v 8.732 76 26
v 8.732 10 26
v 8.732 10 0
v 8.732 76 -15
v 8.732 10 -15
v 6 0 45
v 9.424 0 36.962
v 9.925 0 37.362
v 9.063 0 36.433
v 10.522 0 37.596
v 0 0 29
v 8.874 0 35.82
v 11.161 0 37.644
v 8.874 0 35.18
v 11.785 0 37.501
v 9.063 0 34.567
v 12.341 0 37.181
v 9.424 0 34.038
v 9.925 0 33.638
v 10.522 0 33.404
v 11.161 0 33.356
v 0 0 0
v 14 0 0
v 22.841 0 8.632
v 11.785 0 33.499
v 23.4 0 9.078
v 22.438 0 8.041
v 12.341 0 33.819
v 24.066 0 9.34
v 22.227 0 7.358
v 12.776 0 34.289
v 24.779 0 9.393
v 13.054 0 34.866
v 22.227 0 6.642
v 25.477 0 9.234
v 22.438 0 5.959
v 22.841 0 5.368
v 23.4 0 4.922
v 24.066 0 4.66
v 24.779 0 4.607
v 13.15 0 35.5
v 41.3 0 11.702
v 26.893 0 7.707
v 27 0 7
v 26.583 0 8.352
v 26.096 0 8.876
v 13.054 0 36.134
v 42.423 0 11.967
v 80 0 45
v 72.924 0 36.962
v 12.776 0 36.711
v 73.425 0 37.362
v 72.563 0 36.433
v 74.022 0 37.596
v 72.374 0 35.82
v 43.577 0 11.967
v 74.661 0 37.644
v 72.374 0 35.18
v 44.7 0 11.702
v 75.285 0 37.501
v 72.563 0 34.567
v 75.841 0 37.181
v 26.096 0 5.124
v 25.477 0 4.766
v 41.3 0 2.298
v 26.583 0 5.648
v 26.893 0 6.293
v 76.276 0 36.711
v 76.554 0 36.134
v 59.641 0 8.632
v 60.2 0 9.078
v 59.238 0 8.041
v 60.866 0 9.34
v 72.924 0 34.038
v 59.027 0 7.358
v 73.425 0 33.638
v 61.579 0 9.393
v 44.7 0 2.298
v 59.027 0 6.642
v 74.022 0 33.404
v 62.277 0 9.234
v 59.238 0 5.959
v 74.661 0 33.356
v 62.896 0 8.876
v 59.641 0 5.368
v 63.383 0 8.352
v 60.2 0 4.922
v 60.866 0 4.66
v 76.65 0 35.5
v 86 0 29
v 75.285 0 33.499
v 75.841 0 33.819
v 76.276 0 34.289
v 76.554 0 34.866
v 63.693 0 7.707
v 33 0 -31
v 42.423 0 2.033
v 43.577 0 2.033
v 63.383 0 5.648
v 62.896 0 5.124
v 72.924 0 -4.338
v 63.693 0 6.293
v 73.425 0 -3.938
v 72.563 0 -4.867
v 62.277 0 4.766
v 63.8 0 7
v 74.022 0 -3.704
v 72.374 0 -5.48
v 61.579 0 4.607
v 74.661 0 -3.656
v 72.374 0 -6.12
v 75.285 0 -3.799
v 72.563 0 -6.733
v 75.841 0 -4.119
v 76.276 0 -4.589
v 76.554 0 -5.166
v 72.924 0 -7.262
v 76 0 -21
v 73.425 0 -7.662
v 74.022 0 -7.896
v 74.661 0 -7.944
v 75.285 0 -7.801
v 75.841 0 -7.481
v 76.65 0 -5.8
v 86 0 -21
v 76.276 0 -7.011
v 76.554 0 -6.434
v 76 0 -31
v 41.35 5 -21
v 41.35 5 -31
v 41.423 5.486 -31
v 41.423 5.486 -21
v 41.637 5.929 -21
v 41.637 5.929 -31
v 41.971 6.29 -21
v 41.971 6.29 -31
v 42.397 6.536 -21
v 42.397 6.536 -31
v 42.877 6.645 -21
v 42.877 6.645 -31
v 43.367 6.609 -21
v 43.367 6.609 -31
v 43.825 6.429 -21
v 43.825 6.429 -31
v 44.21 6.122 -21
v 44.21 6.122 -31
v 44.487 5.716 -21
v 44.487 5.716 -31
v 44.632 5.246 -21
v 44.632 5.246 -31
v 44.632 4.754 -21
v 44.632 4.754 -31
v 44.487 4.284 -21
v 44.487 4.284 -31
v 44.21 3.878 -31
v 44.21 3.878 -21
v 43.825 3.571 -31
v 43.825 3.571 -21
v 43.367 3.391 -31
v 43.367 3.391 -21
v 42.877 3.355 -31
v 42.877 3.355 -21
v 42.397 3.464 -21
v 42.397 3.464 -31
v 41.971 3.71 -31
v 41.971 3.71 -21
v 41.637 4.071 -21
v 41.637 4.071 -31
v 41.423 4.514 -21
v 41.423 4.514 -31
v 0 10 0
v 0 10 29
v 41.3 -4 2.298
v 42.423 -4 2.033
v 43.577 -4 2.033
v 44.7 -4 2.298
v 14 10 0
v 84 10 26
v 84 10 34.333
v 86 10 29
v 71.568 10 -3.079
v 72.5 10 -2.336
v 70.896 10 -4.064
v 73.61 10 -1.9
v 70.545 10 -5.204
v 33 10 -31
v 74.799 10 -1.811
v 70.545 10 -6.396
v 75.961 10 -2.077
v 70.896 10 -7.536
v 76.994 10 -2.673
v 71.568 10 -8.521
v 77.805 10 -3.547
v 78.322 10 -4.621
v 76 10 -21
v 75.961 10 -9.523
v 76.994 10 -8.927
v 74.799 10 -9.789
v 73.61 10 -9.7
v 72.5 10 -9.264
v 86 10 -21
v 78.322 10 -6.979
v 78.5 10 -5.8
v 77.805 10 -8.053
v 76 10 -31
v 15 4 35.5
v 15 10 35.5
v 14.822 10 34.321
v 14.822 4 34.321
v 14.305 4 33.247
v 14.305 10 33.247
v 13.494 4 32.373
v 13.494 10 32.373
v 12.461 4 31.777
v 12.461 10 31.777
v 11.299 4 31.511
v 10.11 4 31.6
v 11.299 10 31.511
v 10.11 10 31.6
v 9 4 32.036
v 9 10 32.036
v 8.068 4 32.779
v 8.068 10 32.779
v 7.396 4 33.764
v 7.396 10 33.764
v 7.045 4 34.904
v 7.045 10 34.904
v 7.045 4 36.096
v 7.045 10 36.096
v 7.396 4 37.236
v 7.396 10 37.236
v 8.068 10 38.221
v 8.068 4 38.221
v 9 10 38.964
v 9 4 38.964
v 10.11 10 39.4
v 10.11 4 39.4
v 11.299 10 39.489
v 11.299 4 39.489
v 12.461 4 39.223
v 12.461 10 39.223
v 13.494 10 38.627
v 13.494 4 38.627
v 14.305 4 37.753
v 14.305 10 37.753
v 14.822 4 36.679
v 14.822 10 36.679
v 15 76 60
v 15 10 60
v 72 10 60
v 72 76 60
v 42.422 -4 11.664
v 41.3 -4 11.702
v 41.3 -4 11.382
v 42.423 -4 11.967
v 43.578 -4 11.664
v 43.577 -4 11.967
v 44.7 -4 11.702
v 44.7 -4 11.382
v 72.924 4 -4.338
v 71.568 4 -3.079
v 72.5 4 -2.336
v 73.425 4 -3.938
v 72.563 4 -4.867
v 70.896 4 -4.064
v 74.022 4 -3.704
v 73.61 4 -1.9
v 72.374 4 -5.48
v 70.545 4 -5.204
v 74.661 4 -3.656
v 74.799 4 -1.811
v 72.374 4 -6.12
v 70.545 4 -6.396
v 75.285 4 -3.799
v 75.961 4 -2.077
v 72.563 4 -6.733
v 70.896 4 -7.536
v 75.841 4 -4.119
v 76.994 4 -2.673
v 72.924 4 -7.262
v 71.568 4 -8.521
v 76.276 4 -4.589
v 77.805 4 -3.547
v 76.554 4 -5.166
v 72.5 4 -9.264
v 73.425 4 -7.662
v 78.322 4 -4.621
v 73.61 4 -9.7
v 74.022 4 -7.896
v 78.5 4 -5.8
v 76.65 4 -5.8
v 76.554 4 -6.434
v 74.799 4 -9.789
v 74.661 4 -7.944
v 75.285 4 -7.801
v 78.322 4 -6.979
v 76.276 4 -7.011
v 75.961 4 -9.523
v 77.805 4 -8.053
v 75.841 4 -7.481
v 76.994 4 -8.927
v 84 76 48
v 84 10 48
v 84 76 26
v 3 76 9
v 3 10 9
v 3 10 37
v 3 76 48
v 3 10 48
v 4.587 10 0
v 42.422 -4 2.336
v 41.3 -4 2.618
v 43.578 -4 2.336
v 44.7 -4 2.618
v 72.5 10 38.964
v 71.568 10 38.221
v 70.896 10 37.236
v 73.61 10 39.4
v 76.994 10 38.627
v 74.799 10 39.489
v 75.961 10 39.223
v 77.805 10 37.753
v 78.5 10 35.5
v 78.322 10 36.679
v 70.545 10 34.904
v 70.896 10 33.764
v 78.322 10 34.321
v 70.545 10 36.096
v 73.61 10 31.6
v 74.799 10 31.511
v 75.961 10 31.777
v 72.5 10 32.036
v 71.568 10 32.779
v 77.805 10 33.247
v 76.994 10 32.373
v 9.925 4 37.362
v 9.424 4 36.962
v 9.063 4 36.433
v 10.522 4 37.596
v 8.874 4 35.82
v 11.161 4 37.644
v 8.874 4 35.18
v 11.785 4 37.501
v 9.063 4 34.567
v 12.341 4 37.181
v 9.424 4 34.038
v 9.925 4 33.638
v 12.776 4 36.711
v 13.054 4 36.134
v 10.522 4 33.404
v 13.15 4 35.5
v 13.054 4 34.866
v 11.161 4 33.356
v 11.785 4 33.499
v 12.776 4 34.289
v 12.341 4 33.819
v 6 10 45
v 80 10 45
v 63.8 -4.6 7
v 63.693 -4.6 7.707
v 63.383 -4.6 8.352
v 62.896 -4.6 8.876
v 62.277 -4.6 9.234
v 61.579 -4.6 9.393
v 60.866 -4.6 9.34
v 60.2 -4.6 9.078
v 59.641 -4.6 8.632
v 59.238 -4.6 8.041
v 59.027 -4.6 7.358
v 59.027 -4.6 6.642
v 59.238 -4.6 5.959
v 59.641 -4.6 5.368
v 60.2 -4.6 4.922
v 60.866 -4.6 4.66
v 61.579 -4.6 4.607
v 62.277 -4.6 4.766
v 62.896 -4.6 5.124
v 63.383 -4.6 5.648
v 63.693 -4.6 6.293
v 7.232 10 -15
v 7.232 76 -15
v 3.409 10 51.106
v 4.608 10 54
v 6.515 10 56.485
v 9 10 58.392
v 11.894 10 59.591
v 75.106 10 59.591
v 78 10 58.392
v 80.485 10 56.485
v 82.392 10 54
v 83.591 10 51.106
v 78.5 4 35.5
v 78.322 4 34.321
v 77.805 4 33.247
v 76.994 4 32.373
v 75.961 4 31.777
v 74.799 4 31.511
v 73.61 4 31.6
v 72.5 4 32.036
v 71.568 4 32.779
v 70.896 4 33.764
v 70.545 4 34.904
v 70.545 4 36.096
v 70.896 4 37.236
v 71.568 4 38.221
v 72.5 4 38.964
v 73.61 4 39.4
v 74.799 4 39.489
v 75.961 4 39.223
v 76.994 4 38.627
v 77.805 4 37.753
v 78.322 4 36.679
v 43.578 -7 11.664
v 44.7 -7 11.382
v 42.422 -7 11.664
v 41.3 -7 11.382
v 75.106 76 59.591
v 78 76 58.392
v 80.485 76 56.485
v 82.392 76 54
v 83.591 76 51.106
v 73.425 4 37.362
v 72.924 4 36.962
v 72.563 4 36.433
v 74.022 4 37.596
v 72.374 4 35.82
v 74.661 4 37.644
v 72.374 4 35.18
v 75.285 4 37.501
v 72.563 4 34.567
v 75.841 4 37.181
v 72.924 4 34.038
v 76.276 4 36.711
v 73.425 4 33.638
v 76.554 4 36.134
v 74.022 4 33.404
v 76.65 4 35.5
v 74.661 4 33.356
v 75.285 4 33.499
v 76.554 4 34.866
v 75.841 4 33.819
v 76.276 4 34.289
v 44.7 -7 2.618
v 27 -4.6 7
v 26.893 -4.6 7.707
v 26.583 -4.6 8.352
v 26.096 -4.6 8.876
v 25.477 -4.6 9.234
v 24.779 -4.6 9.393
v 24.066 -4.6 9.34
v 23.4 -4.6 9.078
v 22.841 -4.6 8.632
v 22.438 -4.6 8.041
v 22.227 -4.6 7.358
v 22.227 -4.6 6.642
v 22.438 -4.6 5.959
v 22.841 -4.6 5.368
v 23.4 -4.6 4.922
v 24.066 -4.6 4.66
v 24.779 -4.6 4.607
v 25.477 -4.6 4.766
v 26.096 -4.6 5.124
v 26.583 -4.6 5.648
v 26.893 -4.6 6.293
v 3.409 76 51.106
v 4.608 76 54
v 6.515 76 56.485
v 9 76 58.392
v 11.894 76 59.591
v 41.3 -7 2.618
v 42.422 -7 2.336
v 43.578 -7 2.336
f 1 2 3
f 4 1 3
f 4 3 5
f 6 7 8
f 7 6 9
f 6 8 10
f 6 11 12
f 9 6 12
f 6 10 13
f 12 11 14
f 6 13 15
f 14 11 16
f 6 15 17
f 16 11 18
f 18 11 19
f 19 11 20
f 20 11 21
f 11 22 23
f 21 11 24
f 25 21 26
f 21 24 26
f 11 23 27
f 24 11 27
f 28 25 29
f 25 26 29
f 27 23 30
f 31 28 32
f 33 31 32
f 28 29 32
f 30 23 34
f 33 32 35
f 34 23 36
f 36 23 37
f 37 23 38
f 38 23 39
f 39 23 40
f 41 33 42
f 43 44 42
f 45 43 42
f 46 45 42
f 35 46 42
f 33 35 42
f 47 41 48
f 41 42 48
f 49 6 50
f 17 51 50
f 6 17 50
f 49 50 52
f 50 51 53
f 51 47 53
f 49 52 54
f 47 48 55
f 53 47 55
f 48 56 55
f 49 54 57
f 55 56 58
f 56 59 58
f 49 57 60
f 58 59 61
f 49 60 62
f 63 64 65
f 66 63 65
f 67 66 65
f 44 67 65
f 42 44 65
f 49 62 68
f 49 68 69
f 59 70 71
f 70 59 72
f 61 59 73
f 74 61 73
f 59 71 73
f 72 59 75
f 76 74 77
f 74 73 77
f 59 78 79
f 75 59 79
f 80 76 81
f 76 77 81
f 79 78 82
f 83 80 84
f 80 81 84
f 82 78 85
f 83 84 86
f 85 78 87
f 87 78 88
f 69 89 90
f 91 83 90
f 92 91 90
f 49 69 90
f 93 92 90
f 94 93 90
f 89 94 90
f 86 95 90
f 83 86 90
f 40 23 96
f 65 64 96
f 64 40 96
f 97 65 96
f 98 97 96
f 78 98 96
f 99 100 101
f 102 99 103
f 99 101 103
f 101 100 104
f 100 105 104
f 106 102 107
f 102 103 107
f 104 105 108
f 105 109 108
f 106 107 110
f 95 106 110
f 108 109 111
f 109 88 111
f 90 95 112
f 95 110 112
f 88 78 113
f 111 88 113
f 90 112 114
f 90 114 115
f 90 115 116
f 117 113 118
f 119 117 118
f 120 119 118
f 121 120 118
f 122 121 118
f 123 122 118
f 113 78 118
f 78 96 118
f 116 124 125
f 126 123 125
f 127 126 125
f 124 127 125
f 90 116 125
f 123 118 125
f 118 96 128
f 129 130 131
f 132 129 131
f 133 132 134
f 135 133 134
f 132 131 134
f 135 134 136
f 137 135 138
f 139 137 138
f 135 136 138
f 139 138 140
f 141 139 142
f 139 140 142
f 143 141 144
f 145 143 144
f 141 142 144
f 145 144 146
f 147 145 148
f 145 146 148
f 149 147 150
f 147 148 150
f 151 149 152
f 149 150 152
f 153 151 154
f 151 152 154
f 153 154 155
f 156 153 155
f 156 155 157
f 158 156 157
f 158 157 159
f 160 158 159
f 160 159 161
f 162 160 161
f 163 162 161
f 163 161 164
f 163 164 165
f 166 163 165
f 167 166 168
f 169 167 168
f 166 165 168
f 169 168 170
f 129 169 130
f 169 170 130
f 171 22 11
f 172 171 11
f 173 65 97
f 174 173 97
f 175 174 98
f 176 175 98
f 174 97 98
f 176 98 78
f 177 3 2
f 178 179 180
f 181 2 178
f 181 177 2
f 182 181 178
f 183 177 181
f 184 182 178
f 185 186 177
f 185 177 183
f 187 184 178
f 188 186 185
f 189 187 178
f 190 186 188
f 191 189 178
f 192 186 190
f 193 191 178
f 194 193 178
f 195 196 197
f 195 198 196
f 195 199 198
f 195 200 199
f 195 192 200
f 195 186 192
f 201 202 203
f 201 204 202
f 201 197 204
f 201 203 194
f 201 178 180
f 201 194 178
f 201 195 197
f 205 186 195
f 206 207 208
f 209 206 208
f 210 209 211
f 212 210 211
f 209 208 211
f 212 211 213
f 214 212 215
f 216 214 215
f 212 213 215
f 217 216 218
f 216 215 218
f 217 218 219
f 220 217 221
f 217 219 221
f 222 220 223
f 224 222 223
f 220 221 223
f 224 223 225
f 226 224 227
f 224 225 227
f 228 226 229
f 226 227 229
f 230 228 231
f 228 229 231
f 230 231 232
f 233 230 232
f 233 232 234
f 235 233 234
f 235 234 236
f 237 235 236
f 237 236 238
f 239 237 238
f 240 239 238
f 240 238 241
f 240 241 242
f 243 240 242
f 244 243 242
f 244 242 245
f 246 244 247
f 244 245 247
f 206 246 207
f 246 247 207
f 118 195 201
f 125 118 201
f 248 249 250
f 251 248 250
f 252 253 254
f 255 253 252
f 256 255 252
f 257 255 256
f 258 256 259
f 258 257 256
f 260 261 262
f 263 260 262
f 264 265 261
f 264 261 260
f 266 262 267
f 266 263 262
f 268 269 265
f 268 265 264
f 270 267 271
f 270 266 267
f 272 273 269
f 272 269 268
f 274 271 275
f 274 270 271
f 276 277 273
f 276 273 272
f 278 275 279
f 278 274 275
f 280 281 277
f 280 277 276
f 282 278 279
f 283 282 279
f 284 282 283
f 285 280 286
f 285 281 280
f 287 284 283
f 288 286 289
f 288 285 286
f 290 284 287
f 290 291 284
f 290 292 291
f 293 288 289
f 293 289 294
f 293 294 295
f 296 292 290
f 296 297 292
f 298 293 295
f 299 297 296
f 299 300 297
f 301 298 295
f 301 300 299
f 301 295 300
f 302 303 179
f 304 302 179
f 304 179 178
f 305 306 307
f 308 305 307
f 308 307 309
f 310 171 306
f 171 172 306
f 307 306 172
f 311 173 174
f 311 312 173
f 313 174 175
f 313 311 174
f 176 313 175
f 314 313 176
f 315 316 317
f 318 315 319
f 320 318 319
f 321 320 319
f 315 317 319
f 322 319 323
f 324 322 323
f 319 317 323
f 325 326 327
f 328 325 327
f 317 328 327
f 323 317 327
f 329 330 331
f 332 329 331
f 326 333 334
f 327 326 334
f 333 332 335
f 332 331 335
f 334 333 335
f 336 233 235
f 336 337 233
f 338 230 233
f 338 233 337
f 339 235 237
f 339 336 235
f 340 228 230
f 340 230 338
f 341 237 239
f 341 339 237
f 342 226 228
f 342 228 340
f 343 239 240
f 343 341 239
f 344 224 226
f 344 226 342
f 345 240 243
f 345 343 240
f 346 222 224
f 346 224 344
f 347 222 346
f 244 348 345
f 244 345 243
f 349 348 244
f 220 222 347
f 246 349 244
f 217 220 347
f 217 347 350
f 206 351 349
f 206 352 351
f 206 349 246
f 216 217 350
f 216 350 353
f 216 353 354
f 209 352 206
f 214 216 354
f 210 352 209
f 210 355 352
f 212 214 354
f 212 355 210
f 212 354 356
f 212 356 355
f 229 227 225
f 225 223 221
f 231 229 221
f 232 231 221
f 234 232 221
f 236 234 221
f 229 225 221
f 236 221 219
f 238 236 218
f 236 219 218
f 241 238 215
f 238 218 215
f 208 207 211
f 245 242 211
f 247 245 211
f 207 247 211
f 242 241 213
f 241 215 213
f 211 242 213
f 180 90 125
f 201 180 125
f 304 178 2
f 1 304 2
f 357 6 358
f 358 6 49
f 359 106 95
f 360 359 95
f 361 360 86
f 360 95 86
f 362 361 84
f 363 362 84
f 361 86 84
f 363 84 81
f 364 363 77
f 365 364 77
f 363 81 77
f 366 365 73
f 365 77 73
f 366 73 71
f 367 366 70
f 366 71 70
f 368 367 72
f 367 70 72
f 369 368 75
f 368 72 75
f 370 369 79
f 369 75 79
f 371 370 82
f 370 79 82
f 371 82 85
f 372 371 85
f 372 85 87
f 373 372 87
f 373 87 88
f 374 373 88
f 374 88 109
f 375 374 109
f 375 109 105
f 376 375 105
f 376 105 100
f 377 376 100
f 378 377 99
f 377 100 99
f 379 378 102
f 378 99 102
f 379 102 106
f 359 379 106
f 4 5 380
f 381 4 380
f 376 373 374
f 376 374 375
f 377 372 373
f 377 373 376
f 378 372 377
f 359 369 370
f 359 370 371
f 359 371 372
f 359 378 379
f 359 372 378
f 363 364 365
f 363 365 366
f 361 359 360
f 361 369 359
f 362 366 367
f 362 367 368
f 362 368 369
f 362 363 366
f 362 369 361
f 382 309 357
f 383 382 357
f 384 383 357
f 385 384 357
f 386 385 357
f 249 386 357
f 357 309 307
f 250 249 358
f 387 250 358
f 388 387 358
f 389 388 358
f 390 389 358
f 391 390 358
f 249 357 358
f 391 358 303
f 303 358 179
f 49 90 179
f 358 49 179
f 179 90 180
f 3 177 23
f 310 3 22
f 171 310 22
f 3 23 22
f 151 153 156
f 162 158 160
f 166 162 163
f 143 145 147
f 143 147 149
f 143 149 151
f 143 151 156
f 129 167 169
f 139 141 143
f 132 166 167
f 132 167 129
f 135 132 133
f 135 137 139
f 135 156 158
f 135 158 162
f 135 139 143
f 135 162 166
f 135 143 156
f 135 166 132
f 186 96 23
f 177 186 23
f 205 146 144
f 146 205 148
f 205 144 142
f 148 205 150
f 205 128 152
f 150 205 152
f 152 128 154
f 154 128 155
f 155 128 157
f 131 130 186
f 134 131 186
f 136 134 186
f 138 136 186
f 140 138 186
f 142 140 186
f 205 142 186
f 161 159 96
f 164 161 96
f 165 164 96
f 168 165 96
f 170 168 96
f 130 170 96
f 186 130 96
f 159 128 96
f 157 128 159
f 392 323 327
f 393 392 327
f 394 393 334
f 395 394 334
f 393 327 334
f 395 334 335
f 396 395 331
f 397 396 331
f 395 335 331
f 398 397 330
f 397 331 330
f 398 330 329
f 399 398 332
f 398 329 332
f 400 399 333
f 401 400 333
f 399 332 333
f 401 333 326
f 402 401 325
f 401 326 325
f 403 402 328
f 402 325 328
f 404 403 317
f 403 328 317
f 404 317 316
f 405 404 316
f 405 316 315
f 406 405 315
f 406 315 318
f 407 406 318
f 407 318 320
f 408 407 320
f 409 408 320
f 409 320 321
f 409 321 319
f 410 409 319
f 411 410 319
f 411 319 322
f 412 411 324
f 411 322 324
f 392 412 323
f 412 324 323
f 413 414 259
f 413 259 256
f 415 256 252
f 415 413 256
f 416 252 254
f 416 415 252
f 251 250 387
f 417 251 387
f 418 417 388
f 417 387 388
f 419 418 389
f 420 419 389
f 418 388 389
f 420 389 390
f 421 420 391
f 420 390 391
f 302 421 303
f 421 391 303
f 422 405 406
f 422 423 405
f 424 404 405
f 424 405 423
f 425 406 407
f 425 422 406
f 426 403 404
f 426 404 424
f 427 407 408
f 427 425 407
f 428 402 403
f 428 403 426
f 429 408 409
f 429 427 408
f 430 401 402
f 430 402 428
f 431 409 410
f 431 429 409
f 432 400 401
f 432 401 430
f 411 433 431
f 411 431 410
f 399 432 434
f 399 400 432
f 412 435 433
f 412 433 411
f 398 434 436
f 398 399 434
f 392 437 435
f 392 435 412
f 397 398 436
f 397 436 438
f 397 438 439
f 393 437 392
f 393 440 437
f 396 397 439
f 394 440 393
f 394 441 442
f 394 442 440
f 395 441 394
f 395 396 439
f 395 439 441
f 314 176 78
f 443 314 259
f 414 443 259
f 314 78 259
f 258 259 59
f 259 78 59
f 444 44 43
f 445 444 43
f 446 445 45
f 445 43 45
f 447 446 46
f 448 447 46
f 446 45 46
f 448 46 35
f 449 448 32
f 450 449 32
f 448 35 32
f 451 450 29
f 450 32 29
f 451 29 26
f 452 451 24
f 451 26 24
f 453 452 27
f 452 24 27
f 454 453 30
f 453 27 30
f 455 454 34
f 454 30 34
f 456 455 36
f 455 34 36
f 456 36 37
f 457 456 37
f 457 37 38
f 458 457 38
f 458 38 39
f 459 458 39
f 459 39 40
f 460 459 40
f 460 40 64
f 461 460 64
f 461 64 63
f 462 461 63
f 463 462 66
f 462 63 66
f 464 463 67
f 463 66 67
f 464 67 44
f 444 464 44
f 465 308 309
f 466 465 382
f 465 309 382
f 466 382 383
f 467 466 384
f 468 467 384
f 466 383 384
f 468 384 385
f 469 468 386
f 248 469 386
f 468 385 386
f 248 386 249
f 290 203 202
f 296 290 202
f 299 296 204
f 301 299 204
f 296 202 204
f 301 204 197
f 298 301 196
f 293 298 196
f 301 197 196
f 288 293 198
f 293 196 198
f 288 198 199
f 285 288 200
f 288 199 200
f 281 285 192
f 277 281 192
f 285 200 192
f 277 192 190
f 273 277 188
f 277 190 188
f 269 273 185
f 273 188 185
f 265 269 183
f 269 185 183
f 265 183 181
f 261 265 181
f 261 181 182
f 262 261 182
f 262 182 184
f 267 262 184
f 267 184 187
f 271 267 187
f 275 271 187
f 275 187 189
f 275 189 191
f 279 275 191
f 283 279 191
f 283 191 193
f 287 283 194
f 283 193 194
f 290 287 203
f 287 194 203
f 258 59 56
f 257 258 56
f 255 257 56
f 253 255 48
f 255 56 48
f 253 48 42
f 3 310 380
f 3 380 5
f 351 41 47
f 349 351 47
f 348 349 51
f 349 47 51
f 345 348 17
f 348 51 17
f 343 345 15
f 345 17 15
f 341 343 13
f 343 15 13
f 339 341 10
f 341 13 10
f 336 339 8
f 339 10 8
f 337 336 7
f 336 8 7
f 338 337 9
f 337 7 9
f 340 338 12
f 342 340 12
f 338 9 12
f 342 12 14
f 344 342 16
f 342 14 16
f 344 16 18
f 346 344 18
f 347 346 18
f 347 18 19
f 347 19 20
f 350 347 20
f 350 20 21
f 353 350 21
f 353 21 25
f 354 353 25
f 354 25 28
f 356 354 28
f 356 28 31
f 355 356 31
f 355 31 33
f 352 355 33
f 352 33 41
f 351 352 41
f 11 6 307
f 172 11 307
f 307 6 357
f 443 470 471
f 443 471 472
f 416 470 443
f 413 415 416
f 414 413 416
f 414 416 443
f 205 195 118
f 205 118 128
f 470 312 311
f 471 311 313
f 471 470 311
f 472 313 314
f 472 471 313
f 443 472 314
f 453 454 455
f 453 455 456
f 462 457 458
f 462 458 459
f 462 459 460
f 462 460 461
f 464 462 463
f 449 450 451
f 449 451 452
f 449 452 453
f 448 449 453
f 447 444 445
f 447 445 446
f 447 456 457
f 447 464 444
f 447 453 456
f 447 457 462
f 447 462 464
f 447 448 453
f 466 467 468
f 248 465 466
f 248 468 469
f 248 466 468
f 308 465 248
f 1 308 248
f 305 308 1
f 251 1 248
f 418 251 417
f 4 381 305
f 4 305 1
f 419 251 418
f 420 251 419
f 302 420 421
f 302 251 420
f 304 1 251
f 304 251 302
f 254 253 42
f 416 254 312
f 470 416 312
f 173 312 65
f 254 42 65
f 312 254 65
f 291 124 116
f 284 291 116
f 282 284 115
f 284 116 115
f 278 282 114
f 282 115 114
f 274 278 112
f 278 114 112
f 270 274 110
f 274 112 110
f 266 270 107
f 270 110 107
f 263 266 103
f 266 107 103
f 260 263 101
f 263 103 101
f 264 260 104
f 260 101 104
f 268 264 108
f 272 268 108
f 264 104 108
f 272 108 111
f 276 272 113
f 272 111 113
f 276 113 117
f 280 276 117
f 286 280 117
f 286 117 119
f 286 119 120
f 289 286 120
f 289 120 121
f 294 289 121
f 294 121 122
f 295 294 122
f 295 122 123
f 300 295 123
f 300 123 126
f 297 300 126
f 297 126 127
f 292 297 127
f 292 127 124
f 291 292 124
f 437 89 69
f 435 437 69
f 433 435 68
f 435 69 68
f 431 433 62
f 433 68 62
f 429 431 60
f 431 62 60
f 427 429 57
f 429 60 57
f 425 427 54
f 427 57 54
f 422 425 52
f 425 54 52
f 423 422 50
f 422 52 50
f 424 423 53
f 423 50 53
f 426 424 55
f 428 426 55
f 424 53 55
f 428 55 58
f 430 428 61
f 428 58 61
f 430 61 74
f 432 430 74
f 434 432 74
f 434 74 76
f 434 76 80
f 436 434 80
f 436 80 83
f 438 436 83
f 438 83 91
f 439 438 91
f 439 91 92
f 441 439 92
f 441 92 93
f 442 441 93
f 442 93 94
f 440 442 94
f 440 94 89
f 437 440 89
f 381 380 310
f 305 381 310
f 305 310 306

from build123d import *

# Parameters (mm, degrees)
BOSS_EXTRUDE1_DEPTH = 10
CHAMFER1_SIZE       = 6
CHAMFER1_SIZE2      = 16
CHAMFER2_SIZE       = 16
CHAMFER2_SIZE2      = 6
SKETCH2_W           = 10
SKETCH2_H           = 10
CUT_EXTRUDE1_DEPTH  = 10
BOSS_EXTRUDE2_DEPTH = 7
SKETCH4_R           = 5
SKETCH4_R_2         = 4.7
CUT_EXTRUDE2_DEPTH  = 3
SKETCH5_R           = 2.15
CUT_EXTRUDE3_DEPTH  = 11
SKETCH6_R           = 4
CUT_EXTRUDE4_DEPTH  = 6
SKETCH7_R           = 2.4
BOSS_EXTRUDE3_DEPTH = 4.6
SKETCH8_R           = 1.65
CUT_EXTRUDE5_DEPTH  = 10
BOSS_EXTRUDE4_DEPTH = 66


with BuildPart() as part:
    # Sketch1 → Boss-Extrude1 (new body)
    with BuildSketch(Plane(origin=(0, 0, 0), x_dir=(1, 0, 0), z_dir=(0, 1, 0))):
        Polygon((0, 0), (0, -45), (86, -45), (86, 31), (33, 31), (14, 0), align=None)
    extrude(amount=BOSS_EXTRUDE1_DEPTH)

    # Chamfer1
    chamfer1_edges = [part.edges().sort_by_distance(p)[0] for p in [
        (86, 5, 45),
    ]]
    chamfer1_side = [part.faces().sort_by_distance(p)[0] for p in [
        (43, 5, 45),
    ]]
    chamfer(chamfer1_edges, length=CHAMFER1_SIZE, length2=CHAMFER1_SIZE2, reference=chamfer1_side[0])

    # Chamfer2
    chamfer2_edges = [part.edges().sort_by_distance(p)[0] for p in [
        (0, 5, 45),
    ]]
    chamfer2_side = [part.faces().sort_by_distance(p)[0] for p in [
        (0, 5, 22.5),
    ]]
    chamfer(chamfer2_edges, length=CHAMFER2_SIZE, length2=CHAMFER2_SIZE2, reference=chamfer2_side[0])

    # Sketch2 → Cut-Extrude1 (cut)
    with BuildSketch(Plane(origin=(0, 10, 0), x_dir=(1, 0, 0), z_dir=(0, 1, 0))):
        with Locations((81, 26)):
            Rectangle(SKETCH2_W, SKETCH2_H)
    extrude(amount=-CUT_EXTRUDE1_DEPTH, mode=Mode.SUBTRACT)

    # Sketch3 → Boss-Extrude2 (add)
    with BuildSketch(Plane.XZ):
        with BuildLine():
            Line((44.7, 2.297872822), (44.7, 11.702127178))
            ThreePointArc((44.7, 11.702127178), (43, 12), (41.3, 11.702127178))
            Line((41.3, 11.702127178), (41.3, 2.297872822))
            ThreePointArc((41.3, 2.297872822), (43, 2), (44.7, 2.297872822))
        make_face()
    extrude(amount=BOSS_EXTRUDE2_DEPTH)

    # Sketch4 → Cut-Extrude2 (cut)
    with BuildSketch(Plane.XZ.offset(7)):
        with Locations((43, 7)):
            Circle(SKETCH4_R)
        with Locations((43, 7)):
            Circle(SKETCH4_R_2, mode=Mode.SUBTRACT)
    extrude(amount=-CUT_EXTRUDE2_DEPTH, mode=Mode.SUBTRACT)

    # Sketch5 → Cut-Extrude3 (cut, through all)
    with BuildSketch(Plane.XZ):
        with Locations((74.5, 35.5)):
            Circle(SKETCH5_R)
        with Locations((11, 35.5)):
            Circle(SKETCH5_R)
        with Locations((74.5, -5.8)):
            Circle(SKETCH5_R)
    extrude(amount=-CUT_EXTRUDE3_DEPTH, mode=Mode.SUBTRACT)

    # Sketch6 → Cut-Extrude4 (cut)
    with BuildSketch(Plane(origin=(0, 10, 0), x_dir=(1, 0, 0), z_dir=(0, 1, 0))):
        with Locations((74.5, 5.8)):
            Circle(SKETCH6_R)
        with Locations((74.5, -35.5)):
            Circle(SKETCH6_R)
        with Locations((11, -35.5)):
            Circle(SKETCH6_R)
    extrude(amount=-CUT_EXTRUDE4_DEPTH, mode=Mode.SUBTRACT)

    # Sketch7 → Boss-Extrude3 (add)
    with BuildSketch(Plane.XZ):
        with Locations((61.4, 7)):
            Circle(SKETCH7_R)
        with Locations((24.6, 7)):
            Circle(SKETCH7_R)
    extrude(amount=BOSS_EXTRUDE3_DEPTH)

    # Sketch8 → Cut-Extrude5 (cut)
    with BuildSketch(Plane(origin=(0, 0, -31), x_dir=(-1, 0, 0), z_dir=(0, 0, -1))):
        with Locations((-43, 5)):
            Circle(SKETCH8_R)
    extrude(amount=-CUT_EXTRUDE5_DEPTH, mode=Mode.SUBTRACT)

    # Sketch10 → Boss-Extrude4 (add)
    with BuildSketch(Plane(origin=(0, 10, 0), x_dir=(1, 0, 0), z_dir=(0, 1, 0))):
        with BuildLine():
            Line((15, -60), (72, -60))
            ThreePointArc((72, -60), (80.485281374, -56.485281374), (84, -48))
            Line((84, -48), (84, -26))
            Line((84, -26), (8.731847537, -26))
            Line((8.731847537, -26), (8.731847537, 15))
            Line((8.731847537, 15), (7.231847537, 15))
            Line((7.231847537, 15), (3, -9))
            Line((3, -9), (3, -48))
            ThreePointArc((3, -48), (6.514718626, -56.485281374), (15, -60))
        make_face()
    extrude(amount=BOSS_EXTRUDE4_DEPTH)


solid = part.part
